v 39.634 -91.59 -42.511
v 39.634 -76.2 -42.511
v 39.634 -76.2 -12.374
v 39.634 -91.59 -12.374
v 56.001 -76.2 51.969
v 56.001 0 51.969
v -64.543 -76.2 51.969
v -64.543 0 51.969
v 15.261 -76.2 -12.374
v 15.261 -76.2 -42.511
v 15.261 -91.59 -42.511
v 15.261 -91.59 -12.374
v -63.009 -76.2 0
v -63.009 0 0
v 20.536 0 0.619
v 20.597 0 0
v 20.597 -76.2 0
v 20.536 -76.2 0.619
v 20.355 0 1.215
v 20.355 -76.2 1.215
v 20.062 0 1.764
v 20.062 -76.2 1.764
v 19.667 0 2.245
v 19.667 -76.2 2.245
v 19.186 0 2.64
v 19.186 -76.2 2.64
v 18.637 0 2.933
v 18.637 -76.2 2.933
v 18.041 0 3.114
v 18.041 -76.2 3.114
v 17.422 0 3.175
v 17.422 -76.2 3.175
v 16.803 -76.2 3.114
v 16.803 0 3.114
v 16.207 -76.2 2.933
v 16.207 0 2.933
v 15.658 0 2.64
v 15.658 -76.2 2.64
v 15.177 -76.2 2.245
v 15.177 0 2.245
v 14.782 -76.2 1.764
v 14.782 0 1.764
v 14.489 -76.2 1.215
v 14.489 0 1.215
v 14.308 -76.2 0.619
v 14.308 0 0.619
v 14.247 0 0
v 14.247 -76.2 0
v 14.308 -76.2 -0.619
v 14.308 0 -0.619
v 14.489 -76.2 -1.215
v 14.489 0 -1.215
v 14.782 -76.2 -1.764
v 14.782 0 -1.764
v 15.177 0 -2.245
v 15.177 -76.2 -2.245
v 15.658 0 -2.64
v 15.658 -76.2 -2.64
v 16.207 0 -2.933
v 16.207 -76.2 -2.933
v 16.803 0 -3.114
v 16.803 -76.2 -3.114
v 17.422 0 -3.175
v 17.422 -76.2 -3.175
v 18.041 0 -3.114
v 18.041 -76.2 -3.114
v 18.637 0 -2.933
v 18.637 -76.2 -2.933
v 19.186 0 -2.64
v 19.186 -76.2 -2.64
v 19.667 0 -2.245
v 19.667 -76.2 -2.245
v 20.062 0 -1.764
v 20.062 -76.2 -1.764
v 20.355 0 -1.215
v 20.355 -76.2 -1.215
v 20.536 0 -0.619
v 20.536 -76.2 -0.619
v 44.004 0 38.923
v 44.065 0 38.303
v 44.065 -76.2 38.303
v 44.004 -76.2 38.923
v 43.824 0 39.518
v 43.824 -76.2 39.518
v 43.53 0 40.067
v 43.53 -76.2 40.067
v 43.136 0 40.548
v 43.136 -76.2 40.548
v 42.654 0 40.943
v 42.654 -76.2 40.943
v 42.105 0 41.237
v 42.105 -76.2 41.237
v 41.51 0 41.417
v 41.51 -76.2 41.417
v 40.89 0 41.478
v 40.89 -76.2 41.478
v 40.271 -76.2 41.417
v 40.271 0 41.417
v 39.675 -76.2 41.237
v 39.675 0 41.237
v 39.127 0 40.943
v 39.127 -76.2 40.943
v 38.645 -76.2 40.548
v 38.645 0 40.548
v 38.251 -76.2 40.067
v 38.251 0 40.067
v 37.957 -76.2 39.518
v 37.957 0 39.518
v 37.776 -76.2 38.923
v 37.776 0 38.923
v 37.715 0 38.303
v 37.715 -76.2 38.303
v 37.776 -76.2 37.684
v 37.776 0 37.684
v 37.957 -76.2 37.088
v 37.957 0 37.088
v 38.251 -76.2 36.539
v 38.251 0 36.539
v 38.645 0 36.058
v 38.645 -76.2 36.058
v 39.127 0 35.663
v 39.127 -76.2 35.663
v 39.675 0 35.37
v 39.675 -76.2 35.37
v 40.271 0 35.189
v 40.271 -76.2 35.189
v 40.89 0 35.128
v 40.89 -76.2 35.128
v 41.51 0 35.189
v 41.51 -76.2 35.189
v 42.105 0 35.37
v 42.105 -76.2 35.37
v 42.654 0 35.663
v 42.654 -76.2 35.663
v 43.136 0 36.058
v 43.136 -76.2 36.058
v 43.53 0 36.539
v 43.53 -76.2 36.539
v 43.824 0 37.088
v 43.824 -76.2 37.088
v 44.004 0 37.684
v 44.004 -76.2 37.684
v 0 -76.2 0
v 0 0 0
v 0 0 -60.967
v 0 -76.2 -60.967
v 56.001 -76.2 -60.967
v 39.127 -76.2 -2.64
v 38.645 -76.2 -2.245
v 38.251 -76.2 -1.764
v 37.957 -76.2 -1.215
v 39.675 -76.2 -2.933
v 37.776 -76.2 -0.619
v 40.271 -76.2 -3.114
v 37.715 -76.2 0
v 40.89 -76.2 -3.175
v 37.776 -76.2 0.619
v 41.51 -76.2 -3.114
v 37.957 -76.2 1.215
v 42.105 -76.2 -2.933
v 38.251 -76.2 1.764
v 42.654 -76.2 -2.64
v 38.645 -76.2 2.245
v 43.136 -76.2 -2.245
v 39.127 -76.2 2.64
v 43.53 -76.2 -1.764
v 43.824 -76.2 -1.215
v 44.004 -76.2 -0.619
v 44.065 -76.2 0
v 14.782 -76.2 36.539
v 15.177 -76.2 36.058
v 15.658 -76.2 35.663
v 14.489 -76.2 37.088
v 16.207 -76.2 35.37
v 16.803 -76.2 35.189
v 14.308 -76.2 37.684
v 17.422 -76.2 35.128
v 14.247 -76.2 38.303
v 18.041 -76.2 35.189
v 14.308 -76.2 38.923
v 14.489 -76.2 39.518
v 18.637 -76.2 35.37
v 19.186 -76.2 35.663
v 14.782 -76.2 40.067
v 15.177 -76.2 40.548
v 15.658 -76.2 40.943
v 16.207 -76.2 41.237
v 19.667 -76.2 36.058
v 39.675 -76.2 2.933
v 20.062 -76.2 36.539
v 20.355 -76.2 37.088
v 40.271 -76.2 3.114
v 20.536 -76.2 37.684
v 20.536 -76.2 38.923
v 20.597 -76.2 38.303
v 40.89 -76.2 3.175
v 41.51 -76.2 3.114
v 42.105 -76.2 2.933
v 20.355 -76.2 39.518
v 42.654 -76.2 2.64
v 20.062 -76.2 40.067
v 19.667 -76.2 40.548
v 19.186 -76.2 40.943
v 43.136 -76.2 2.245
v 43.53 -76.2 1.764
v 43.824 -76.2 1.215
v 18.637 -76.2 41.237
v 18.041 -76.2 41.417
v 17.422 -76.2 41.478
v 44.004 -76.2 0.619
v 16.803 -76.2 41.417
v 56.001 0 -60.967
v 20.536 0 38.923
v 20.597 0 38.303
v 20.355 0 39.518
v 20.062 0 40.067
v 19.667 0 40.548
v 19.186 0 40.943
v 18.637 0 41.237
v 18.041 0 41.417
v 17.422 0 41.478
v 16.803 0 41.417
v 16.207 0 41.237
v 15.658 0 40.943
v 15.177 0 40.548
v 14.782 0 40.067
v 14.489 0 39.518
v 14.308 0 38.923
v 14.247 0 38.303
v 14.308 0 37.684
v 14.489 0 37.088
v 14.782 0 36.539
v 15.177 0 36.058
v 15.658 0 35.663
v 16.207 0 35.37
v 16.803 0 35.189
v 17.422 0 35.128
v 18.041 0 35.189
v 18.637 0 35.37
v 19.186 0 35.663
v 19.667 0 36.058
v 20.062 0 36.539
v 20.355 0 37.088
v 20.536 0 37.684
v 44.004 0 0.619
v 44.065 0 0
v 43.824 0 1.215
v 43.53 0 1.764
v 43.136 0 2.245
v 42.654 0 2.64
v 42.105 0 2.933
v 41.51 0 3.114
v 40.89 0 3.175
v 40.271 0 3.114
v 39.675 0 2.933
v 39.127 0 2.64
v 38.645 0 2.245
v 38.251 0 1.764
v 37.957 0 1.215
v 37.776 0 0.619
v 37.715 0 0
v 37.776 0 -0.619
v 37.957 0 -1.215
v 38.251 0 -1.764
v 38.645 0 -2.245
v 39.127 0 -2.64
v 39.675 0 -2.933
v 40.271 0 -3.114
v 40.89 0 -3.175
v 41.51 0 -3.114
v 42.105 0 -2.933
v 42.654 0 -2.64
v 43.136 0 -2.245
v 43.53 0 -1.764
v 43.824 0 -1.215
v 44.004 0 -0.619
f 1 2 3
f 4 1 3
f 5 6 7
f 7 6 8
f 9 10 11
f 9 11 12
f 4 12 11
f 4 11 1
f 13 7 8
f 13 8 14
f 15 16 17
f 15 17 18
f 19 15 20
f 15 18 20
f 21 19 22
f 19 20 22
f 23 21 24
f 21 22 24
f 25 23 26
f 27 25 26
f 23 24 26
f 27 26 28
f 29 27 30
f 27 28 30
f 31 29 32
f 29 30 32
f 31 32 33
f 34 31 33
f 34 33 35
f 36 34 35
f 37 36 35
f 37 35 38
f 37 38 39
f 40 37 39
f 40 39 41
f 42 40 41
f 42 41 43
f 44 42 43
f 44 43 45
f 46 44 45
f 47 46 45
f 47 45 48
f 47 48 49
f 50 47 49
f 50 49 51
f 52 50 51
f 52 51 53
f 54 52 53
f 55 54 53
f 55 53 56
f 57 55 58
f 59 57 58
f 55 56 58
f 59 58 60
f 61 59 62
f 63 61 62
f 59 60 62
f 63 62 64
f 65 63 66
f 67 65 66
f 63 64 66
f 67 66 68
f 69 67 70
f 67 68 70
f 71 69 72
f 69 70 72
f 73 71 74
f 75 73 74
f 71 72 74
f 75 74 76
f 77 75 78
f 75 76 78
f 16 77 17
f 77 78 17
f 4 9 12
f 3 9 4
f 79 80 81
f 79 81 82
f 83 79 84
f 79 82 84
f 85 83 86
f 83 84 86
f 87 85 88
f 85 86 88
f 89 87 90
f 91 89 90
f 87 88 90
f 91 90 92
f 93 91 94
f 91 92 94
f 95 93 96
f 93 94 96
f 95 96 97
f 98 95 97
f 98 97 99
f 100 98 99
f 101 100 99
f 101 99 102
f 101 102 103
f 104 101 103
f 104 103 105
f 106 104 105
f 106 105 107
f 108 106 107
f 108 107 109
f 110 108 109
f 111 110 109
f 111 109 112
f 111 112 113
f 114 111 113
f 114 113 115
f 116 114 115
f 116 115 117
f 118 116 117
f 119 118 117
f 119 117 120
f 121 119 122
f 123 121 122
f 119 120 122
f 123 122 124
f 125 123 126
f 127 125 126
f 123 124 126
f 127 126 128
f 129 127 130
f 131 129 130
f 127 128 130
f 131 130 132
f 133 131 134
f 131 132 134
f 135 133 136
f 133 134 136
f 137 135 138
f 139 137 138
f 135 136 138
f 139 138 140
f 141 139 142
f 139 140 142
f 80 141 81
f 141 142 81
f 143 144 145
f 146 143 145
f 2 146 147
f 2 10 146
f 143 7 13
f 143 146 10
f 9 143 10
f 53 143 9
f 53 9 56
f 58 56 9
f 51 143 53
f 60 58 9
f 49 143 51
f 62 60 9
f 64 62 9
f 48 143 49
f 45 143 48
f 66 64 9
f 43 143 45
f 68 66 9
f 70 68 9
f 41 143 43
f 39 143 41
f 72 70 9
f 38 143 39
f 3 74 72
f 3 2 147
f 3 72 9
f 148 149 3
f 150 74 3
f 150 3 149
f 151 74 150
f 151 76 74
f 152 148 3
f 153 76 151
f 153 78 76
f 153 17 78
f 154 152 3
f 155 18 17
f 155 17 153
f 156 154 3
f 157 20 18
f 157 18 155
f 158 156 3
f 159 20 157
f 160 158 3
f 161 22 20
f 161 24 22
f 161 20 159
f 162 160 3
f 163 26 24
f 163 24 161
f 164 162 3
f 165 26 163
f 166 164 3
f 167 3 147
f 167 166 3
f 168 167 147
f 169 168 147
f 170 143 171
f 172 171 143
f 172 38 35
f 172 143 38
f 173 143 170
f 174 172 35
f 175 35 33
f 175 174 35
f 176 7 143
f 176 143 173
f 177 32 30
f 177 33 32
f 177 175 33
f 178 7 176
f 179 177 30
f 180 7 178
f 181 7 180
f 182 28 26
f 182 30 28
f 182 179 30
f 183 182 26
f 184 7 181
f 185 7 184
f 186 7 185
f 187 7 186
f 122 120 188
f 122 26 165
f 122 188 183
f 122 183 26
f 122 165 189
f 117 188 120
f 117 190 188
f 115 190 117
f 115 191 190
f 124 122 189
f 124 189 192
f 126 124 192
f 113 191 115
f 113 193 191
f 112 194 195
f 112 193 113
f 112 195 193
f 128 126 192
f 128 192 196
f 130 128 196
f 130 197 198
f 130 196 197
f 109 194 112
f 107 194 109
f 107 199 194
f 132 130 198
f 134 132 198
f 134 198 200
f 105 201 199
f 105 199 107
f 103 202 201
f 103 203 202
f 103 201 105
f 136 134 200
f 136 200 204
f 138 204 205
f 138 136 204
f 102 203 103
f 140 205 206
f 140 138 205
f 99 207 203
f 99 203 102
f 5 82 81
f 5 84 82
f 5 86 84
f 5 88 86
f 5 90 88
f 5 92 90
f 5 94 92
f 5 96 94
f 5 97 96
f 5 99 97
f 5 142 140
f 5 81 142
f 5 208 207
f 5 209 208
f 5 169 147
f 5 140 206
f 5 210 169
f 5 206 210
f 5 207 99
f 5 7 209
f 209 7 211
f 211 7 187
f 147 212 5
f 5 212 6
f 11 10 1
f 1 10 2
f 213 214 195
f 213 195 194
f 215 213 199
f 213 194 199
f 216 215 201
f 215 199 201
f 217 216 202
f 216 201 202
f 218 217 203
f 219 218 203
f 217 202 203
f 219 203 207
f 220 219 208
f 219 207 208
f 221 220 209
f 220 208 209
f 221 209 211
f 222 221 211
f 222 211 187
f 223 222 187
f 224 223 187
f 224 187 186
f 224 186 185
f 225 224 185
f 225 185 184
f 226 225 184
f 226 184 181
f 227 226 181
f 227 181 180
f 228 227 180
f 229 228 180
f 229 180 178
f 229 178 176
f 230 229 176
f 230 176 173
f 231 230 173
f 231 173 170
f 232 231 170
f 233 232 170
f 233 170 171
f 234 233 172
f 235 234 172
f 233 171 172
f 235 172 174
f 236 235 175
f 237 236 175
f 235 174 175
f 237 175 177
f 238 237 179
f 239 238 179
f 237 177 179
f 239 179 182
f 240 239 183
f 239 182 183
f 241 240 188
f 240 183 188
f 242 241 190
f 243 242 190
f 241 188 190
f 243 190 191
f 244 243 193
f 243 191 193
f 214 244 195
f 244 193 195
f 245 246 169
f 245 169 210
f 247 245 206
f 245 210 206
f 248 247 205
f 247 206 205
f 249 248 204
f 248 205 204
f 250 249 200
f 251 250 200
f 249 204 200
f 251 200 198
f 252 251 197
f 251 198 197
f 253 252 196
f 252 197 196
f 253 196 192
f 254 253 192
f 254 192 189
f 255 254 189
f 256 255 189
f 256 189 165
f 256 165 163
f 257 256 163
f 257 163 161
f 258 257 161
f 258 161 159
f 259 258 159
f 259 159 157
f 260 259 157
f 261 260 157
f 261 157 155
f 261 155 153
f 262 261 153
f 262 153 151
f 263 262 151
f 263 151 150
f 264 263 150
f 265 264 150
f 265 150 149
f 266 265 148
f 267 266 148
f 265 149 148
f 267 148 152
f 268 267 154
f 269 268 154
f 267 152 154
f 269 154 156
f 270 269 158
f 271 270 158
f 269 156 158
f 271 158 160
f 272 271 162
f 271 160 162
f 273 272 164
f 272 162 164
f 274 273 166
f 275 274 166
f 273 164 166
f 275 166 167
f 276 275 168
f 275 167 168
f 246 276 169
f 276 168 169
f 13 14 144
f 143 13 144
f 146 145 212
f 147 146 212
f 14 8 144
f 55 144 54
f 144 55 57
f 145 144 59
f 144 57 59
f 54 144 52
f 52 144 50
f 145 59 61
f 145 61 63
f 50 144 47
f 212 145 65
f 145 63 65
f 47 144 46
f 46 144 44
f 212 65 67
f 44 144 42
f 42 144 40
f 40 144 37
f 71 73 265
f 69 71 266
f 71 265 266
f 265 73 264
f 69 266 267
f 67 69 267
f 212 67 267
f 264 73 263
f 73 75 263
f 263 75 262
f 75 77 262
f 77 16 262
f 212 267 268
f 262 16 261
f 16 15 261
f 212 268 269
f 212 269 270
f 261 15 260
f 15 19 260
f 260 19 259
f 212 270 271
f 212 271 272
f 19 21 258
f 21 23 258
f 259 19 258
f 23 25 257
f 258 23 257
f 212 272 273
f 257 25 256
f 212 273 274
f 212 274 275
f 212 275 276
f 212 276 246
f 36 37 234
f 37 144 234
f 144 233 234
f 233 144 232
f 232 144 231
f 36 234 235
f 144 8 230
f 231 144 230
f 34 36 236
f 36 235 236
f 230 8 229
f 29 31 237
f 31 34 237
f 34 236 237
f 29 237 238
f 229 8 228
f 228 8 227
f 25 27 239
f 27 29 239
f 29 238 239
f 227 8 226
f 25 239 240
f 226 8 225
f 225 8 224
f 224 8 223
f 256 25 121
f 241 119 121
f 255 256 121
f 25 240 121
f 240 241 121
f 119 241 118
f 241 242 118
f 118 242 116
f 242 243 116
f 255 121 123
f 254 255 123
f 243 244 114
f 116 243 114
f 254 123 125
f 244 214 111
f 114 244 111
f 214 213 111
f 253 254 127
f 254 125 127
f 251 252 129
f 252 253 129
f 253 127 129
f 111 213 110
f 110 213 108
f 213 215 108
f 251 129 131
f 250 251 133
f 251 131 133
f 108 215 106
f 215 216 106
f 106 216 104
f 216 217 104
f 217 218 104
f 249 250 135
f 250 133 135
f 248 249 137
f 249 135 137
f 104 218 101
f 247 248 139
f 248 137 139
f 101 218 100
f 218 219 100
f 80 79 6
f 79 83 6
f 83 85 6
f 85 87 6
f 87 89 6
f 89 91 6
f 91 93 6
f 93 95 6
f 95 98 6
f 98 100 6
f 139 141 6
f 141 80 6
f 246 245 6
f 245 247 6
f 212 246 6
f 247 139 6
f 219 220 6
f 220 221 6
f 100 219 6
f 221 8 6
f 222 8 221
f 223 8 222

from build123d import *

# Parameters (mm, degrees)
F1_DEPTH = 76.2
F3_D     = 6.35
F4_W     = 24.373029
F4_H     = 30.136249
F5_DEPTH = 15.38986


with BuildPart() as f1:
    # F0 (on Front) → F1 (new body)
    with BuildSketch(Plane.XZ):
        Polygon((-64.54286, 51.968571), (-63.009351, 0), (0, 0), (0, -60.967304), (56.001253, -60.967304), (56.001253, 51.968571), align=None)
    extrude(amount=F1_DEPTH)

    # F3 (through all)
    with Locations(Plane(origin=(0, 0, 0), x_dir=(-1, 0, 0), z_dir=(0, 1, 0))):
        with Locations((-40.89044, 38.303375), (-17.421992, 38.303375), (-17.421992, 0), (-40.89044, 0)):
            Hole(F3_D / 2)

    # F4 (on face) → F5 (join)
    with BuildSketch(Plane.XZ.offset(76.2)):
        with Locations((27.447664, -27.442444)):
            Rectangle(F4_W, F4_H)
    extrude(amount=F5_DEPTH)


solid = f1.part
